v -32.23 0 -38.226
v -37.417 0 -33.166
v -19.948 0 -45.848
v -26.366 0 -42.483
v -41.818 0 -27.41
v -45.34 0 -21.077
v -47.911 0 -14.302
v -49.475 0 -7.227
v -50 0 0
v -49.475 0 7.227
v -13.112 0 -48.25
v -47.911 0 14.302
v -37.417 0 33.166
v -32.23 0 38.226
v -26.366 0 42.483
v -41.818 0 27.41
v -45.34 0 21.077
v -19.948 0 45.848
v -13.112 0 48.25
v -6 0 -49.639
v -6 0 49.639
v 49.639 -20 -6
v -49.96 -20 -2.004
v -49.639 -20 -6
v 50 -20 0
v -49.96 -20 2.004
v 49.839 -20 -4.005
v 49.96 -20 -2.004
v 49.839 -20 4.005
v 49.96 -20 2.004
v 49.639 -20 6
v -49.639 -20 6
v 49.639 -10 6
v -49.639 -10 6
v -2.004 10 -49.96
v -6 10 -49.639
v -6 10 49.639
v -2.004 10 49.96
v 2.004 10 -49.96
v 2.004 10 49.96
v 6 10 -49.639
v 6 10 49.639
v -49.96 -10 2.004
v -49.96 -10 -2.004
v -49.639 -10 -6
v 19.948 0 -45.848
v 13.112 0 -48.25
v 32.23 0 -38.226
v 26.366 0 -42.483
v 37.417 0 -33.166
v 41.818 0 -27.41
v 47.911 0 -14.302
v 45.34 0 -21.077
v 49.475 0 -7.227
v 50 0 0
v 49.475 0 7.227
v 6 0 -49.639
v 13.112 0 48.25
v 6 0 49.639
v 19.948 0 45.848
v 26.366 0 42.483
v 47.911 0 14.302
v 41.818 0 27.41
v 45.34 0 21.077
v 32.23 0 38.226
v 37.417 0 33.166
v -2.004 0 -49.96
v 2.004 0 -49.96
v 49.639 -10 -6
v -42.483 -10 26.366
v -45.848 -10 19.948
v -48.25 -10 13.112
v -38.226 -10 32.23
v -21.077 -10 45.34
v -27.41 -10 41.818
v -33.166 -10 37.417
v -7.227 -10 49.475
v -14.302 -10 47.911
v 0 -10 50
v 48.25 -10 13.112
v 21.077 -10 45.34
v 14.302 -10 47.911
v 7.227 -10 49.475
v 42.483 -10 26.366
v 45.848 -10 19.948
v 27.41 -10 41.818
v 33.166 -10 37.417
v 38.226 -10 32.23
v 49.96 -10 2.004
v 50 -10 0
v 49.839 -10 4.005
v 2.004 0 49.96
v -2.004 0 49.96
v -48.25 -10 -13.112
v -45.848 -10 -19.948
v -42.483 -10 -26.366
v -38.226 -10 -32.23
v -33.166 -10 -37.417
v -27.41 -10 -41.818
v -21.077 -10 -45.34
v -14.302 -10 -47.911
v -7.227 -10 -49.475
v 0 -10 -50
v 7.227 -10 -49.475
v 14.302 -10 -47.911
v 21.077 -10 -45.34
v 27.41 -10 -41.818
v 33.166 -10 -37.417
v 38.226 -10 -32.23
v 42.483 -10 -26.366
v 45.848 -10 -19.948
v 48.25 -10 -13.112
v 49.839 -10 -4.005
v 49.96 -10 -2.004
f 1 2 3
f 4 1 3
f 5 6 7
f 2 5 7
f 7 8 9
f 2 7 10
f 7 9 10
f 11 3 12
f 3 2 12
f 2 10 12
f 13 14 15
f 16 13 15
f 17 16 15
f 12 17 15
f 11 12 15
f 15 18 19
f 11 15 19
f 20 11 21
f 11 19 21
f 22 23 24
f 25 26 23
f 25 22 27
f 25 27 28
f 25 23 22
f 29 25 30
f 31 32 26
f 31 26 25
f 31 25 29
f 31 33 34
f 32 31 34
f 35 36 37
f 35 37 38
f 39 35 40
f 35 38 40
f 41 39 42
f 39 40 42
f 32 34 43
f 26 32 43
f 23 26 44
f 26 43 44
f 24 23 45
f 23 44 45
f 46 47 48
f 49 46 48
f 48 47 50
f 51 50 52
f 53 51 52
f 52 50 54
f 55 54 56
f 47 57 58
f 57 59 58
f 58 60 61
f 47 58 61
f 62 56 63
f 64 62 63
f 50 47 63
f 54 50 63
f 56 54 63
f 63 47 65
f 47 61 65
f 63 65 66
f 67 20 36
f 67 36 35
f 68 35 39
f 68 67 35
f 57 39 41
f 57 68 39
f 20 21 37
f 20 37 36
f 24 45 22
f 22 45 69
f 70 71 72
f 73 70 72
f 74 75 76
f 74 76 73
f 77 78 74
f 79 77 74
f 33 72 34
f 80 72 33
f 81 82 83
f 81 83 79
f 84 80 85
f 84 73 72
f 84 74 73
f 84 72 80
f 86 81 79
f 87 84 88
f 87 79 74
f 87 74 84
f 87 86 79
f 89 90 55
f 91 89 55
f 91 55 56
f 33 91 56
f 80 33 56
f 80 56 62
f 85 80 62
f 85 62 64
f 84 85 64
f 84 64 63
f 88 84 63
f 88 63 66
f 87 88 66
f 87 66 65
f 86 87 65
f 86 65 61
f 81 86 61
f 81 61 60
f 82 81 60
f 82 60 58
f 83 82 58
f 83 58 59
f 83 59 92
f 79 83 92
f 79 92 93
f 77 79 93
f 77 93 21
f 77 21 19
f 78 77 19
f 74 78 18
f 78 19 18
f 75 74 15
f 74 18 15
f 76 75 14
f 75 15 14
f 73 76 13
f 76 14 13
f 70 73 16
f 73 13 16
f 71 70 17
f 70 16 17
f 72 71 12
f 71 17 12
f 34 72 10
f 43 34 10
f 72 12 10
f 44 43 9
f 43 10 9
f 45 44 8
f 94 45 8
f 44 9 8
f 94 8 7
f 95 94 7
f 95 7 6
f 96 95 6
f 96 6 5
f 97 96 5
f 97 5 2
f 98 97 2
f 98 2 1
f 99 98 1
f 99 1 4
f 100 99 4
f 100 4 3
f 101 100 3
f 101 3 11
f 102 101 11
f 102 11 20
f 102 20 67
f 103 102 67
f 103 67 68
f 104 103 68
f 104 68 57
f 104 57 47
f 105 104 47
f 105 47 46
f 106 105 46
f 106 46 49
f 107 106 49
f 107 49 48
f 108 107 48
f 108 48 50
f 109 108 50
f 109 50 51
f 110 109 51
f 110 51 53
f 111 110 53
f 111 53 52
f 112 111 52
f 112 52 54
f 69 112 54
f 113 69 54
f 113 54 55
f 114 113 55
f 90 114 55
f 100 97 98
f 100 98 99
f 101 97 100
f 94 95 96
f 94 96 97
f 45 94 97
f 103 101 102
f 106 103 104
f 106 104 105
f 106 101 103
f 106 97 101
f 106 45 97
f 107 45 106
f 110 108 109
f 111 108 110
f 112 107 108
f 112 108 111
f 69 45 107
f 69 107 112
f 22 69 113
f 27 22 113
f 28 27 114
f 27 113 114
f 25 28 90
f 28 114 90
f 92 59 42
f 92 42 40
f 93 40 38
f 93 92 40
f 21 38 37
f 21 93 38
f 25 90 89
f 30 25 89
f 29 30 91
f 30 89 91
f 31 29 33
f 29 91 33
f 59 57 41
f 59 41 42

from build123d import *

# Parameters (mm, degrees)
F0_R     = 50
F1_DEPTH = 10
F3_DEPTH = 10
F5_DEPTH = 10


with BuildPart() as f1:
    # F0 (on Front) → F1 (new body)
    with BuildSketch(Plane.XZ):
        Circle(F0_R)
    extrude(amount=F1_DEPTH)

    # F2 (on face) → F3 (join)
    with BuildSketch(Plane.XZ.offset(10)):
        with BuildLine():
            Line((49.638694584, 6), (-49.638694584, 6))
            ThreePointArc((-49.638694584, 6), (-50, 0), (-49.638694584, -6))
            Line((-49.638694584, -6), (49.638694584, -6))
            ThreePointArc((49.638694584, -6), (49.9095919098, -3.0054343115), (50, 0))
            ThreePointArc((50, 0), (49.9095919098, 3.0054343115), (49.638694584, 6))
        make_face()
    extrude(amount=F3_DEPTH)

    # F4 (on Front) → F5 (join)
    with BuildSketch(Plane.XZ):
        with BuildLine():
            Line((6, -49.638694584), (6, 49.638694584))
            ThreePointArc((6, 49.638694584), (0, 50), (-6, 49.638694584))
            Line((-6, 49.638694584), (-6, -49.638694584))
            ThreePointArc((-6, -49.638694584), (0, -50), (6, -49.638694584))
        make_face()
    extrude(amount=-F5_DEPTH)


solid = f1.part
